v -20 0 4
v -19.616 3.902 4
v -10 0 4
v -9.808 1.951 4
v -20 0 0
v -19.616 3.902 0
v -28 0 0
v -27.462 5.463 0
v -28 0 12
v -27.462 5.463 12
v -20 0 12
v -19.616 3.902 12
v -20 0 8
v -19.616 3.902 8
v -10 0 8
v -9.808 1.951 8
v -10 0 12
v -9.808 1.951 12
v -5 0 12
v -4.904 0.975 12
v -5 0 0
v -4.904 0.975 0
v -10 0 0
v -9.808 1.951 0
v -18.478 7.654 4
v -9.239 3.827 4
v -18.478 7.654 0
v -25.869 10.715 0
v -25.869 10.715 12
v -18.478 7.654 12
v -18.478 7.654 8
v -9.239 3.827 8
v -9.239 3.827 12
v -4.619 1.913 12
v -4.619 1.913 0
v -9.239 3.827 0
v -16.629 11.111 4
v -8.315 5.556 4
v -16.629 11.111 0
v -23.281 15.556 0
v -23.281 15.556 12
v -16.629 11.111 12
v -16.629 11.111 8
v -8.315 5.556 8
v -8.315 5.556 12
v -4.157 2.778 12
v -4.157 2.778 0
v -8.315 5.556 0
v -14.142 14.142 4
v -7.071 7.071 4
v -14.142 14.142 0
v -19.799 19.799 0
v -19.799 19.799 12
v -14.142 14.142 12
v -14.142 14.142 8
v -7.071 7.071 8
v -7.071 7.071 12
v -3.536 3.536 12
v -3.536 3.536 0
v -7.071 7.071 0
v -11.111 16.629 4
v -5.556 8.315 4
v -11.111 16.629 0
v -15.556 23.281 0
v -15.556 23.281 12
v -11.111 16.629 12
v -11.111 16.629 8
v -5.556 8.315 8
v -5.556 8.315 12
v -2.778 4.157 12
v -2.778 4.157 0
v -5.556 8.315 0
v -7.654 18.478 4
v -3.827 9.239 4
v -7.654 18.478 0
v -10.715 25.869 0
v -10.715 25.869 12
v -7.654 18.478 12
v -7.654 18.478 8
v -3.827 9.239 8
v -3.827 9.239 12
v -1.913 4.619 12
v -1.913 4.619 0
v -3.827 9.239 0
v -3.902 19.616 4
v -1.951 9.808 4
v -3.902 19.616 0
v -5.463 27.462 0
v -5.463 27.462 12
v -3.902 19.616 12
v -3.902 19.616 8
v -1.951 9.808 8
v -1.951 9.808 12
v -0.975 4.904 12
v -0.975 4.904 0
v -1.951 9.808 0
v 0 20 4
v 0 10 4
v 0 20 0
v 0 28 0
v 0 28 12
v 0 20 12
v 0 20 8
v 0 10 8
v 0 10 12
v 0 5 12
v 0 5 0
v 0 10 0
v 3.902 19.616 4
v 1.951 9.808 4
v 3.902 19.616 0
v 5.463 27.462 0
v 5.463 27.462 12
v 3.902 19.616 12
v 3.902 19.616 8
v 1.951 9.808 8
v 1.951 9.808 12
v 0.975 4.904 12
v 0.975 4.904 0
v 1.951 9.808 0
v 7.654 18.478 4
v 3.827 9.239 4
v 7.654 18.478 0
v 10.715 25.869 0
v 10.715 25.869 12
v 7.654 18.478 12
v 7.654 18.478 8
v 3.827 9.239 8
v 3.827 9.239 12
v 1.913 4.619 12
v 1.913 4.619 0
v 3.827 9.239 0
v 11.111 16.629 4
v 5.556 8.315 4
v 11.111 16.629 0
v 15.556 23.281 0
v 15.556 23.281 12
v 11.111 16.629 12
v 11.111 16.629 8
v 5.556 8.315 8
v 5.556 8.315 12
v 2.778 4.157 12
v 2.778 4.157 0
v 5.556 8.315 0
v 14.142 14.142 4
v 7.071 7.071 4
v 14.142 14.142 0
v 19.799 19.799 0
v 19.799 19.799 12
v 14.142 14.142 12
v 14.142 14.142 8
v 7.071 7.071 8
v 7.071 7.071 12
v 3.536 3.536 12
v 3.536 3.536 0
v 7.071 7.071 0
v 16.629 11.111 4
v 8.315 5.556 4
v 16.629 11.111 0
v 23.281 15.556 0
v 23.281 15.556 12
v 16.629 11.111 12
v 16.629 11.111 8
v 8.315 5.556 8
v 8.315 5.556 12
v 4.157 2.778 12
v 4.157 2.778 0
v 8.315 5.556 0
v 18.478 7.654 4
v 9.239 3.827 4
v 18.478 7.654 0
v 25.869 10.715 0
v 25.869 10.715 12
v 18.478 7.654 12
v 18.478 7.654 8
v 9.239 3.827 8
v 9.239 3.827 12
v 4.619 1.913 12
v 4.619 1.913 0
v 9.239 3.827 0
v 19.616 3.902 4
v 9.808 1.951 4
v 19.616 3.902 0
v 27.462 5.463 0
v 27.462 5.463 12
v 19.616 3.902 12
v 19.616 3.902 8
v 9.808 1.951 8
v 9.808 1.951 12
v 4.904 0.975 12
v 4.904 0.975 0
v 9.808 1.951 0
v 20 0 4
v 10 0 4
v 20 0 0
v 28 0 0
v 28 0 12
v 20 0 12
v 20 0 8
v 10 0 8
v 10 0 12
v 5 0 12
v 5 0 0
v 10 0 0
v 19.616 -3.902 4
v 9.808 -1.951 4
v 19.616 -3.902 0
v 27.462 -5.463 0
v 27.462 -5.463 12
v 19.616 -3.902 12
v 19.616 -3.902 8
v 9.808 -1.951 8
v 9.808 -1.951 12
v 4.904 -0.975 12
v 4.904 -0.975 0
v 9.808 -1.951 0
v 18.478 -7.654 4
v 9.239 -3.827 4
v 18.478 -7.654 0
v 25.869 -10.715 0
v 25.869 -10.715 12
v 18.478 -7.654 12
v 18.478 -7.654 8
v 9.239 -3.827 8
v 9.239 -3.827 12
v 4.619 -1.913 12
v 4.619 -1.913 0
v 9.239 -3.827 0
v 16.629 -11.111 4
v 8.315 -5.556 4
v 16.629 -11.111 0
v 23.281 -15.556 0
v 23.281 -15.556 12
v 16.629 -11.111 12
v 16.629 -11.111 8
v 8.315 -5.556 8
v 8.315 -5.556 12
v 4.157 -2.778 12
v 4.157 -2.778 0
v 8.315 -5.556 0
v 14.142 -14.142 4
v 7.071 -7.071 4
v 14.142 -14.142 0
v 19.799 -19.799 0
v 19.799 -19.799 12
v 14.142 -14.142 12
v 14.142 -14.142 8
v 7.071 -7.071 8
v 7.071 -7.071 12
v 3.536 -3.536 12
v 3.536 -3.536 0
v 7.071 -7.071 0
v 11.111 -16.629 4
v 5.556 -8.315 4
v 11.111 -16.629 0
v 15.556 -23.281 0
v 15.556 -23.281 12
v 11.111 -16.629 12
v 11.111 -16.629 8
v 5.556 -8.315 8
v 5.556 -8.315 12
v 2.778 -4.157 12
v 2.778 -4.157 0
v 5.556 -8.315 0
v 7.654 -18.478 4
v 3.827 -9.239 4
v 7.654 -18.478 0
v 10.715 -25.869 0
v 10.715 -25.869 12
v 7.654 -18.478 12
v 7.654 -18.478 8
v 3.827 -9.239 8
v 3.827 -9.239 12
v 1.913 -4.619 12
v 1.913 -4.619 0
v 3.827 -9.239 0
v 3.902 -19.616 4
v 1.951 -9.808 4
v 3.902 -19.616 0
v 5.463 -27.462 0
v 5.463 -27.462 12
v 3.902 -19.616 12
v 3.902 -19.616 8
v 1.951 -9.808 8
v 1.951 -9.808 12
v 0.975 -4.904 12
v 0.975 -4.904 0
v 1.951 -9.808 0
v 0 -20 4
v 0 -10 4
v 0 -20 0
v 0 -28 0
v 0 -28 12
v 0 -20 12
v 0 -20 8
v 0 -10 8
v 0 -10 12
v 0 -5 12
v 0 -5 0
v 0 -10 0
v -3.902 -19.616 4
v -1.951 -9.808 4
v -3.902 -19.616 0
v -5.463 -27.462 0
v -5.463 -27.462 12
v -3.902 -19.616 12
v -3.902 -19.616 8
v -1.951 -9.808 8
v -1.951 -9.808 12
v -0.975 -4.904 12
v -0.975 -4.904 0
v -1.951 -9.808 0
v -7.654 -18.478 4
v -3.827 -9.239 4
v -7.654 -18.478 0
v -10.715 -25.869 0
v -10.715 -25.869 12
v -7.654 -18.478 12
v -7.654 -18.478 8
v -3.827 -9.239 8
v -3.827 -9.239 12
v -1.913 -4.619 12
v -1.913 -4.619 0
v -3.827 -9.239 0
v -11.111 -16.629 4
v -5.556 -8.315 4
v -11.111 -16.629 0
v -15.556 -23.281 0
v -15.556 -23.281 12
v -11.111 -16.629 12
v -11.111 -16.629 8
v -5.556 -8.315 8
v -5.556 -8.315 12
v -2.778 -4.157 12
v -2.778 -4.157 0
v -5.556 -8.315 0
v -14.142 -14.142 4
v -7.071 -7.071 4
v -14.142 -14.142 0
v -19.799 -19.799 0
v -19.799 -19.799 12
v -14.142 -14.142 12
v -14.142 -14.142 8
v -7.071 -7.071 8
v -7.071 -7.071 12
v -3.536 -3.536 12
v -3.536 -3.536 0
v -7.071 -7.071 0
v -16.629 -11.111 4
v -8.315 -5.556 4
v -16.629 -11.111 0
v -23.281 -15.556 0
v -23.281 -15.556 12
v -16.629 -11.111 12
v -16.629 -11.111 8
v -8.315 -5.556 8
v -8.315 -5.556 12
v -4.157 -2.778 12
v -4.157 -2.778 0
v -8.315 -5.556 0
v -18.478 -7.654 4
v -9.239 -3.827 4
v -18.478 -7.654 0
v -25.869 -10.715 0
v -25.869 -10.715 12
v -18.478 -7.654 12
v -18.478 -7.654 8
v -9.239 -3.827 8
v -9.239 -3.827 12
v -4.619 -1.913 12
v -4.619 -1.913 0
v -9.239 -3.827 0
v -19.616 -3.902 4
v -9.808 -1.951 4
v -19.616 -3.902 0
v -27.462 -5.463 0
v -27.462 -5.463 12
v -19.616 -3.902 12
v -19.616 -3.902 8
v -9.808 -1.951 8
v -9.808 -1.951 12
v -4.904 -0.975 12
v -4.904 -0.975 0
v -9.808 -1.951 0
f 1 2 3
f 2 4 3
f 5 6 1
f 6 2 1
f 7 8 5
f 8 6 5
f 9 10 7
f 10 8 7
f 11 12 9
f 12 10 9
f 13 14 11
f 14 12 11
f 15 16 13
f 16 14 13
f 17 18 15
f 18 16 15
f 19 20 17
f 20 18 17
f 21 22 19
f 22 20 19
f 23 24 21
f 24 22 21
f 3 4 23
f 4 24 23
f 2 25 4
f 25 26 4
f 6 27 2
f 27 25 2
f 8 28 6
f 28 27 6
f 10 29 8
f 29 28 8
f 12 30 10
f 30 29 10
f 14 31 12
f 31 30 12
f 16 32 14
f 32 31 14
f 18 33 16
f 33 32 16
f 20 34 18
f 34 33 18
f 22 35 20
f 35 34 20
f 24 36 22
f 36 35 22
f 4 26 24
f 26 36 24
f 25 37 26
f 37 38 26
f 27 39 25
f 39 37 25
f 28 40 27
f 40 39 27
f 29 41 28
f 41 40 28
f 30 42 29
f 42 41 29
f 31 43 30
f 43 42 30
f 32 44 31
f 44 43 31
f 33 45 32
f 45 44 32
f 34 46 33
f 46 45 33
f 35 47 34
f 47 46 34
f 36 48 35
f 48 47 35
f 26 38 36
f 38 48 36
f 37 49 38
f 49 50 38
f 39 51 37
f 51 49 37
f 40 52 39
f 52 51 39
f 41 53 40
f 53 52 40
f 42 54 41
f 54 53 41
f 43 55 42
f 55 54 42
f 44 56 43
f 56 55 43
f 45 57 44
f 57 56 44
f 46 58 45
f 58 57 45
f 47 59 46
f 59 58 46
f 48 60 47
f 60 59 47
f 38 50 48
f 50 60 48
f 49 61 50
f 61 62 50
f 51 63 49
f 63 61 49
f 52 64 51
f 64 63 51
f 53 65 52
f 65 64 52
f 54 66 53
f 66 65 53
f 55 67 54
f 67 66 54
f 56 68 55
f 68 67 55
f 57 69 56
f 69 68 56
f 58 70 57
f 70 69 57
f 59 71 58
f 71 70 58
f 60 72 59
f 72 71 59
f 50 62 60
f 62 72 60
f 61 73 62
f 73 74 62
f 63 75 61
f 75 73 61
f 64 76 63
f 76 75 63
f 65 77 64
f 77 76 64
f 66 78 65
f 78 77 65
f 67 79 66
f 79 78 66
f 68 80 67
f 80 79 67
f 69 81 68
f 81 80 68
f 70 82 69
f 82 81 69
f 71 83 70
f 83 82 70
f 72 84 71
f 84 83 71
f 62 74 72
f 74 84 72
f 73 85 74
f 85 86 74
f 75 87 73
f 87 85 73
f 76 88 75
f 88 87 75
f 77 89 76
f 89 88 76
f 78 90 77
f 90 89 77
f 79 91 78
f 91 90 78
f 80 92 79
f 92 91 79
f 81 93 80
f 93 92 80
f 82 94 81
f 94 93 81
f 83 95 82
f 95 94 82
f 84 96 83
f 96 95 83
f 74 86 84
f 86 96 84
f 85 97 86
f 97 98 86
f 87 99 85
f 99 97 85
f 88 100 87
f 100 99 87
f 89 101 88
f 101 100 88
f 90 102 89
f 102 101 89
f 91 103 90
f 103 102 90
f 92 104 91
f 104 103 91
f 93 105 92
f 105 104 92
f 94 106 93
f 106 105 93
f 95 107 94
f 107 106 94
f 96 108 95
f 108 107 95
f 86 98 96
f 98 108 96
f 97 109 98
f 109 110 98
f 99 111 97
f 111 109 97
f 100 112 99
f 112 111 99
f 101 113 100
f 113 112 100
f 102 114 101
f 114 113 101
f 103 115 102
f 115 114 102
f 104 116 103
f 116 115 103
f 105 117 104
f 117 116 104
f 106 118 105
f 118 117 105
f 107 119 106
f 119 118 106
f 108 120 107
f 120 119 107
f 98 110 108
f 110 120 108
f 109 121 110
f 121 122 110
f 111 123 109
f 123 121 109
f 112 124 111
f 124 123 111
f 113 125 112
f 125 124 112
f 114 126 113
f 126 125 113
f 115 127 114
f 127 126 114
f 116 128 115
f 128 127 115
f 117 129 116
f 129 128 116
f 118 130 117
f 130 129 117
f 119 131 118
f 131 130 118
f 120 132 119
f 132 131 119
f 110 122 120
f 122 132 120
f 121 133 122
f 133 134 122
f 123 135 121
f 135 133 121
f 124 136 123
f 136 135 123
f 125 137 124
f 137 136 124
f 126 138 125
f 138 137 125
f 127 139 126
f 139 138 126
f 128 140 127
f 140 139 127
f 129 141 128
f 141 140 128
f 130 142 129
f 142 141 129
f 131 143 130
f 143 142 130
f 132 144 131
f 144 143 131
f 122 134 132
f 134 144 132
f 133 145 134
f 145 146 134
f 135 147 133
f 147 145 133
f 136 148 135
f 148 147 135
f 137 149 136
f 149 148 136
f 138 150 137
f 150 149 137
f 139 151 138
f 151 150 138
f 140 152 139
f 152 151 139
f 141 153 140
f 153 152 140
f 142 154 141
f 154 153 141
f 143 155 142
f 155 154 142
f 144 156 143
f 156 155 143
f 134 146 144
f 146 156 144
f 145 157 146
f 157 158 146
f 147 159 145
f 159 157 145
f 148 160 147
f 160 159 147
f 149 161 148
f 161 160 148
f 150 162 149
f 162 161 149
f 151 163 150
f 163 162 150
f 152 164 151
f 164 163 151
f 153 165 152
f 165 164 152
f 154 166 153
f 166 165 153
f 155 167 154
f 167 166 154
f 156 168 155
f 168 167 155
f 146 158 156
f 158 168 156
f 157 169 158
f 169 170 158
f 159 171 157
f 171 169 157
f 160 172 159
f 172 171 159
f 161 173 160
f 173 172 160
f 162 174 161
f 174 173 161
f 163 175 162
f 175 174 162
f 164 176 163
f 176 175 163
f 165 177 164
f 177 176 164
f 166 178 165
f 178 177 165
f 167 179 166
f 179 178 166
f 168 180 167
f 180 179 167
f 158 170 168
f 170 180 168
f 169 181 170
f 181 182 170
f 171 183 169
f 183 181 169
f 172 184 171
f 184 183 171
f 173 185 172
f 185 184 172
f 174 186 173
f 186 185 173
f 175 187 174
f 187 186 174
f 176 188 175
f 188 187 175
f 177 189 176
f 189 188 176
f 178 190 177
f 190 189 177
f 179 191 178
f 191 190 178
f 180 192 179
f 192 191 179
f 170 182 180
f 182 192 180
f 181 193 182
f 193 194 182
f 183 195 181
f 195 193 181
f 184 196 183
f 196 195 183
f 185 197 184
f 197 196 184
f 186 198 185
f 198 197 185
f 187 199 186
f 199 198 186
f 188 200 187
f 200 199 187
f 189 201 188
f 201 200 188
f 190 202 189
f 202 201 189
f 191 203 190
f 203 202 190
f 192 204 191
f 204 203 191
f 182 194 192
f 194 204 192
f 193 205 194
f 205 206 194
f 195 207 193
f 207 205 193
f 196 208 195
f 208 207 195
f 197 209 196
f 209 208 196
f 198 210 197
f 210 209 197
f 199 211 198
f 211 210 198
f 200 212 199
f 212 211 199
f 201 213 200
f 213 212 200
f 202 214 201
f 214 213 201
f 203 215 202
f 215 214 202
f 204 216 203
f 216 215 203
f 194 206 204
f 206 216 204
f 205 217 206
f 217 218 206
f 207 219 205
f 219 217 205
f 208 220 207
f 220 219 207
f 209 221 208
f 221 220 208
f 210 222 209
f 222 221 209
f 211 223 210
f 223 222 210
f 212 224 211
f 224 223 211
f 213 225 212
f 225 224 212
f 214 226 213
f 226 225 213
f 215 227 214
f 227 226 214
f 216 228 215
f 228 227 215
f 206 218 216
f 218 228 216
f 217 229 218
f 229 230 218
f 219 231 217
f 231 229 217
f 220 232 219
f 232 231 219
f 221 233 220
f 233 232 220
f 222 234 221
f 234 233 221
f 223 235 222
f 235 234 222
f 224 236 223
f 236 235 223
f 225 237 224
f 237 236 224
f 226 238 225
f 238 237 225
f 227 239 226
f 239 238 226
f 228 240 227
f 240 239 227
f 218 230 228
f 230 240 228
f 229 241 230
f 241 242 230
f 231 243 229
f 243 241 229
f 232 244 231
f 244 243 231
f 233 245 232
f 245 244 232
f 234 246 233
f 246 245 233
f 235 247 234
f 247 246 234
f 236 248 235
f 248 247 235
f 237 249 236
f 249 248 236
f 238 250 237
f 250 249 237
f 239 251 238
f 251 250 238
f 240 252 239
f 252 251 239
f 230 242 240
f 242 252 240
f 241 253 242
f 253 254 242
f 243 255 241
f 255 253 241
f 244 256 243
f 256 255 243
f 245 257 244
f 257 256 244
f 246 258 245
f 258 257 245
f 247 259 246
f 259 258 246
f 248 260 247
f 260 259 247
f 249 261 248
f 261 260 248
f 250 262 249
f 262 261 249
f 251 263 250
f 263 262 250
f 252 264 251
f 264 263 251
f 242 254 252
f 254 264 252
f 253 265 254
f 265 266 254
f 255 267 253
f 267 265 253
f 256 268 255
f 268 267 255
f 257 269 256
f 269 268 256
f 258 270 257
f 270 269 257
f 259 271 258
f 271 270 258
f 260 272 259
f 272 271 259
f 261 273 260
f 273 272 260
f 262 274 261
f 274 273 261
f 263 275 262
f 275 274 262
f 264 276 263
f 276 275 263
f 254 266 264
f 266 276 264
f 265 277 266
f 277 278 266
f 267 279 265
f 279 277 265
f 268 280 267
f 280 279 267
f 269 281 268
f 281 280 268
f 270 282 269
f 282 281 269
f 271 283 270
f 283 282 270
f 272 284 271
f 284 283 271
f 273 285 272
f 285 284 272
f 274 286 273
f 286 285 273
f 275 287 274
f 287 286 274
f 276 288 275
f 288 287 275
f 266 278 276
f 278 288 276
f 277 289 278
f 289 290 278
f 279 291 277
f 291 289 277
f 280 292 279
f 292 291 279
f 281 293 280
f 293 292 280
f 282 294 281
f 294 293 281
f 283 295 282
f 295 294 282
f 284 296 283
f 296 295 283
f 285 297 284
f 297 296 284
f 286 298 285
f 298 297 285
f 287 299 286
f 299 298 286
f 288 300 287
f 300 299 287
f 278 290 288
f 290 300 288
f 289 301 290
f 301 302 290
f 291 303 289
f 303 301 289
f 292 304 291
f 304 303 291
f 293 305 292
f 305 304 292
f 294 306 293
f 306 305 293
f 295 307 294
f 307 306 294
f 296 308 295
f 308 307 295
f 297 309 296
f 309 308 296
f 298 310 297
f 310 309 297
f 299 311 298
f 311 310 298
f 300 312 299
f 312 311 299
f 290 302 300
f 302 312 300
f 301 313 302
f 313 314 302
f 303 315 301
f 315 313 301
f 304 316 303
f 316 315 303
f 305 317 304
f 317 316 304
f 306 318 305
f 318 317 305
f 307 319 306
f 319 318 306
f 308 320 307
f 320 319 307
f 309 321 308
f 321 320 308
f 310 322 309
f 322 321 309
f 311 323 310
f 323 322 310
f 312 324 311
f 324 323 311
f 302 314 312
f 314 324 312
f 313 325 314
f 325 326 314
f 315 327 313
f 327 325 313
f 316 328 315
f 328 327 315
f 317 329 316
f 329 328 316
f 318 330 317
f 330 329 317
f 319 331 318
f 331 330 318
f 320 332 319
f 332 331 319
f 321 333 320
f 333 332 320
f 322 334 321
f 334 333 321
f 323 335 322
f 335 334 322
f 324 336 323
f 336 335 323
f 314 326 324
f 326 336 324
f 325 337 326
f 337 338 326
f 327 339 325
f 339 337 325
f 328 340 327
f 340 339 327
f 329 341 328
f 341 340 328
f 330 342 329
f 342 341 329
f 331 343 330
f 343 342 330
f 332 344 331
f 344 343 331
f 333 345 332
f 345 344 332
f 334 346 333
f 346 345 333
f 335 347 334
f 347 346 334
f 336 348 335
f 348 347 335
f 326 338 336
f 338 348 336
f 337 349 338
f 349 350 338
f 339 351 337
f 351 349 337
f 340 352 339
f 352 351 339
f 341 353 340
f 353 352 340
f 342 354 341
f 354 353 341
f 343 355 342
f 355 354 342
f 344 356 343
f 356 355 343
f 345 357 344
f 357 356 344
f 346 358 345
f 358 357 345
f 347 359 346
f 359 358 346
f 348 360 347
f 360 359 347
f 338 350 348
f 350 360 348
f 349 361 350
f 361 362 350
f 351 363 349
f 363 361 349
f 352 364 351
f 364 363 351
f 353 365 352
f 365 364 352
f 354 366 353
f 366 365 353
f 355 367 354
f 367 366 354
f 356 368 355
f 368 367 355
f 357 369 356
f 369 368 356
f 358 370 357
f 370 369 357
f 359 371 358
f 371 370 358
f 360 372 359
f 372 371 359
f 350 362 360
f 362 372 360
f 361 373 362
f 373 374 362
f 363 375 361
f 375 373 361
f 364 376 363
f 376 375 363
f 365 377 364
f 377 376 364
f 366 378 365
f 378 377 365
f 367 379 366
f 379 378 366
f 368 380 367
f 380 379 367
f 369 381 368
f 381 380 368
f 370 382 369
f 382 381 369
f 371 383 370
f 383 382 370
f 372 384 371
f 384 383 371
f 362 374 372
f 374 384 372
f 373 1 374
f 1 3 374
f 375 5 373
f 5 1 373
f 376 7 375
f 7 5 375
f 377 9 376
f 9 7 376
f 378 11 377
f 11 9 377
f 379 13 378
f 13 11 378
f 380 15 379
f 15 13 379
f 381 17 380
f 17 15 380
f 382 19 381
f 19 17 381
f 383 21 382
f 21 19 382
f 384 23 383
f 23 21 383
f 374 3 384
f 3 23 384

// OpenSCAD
$fn = 32;

// ----------------------------------------------------------------------
// Revolved part: handwheel R28
// ----------------------------------------------------------------------

// --- parameters (mm) ---
bore_r = 5;               // bore radius
rim_r = 28;               // rim radius
rim_w = 8;                // rim axial width
rim_t = 12;               // rim diameter height
hub_r = 10;               // hub radius
web_t = 4;                // web thickness
revolve_angle = 360;      // revolve sweep, degrees

bore_d = 2 * bore_r;
rim_d = 2 * rim_r;
hub_d = 2 * hub_r;

profile = [[5, 0], [10, 0], [10, 4], [20, 4], [20, 0], [28, 0], [28, 12], [20, 12], [20, 8], [10, 8], [10, 12], [5, 12]];  // primary outline, 12 points, counter clockwise

// --- the one profile operation ---
rotate_extrude(angle = revolve_angle) polygon(points = profile);
